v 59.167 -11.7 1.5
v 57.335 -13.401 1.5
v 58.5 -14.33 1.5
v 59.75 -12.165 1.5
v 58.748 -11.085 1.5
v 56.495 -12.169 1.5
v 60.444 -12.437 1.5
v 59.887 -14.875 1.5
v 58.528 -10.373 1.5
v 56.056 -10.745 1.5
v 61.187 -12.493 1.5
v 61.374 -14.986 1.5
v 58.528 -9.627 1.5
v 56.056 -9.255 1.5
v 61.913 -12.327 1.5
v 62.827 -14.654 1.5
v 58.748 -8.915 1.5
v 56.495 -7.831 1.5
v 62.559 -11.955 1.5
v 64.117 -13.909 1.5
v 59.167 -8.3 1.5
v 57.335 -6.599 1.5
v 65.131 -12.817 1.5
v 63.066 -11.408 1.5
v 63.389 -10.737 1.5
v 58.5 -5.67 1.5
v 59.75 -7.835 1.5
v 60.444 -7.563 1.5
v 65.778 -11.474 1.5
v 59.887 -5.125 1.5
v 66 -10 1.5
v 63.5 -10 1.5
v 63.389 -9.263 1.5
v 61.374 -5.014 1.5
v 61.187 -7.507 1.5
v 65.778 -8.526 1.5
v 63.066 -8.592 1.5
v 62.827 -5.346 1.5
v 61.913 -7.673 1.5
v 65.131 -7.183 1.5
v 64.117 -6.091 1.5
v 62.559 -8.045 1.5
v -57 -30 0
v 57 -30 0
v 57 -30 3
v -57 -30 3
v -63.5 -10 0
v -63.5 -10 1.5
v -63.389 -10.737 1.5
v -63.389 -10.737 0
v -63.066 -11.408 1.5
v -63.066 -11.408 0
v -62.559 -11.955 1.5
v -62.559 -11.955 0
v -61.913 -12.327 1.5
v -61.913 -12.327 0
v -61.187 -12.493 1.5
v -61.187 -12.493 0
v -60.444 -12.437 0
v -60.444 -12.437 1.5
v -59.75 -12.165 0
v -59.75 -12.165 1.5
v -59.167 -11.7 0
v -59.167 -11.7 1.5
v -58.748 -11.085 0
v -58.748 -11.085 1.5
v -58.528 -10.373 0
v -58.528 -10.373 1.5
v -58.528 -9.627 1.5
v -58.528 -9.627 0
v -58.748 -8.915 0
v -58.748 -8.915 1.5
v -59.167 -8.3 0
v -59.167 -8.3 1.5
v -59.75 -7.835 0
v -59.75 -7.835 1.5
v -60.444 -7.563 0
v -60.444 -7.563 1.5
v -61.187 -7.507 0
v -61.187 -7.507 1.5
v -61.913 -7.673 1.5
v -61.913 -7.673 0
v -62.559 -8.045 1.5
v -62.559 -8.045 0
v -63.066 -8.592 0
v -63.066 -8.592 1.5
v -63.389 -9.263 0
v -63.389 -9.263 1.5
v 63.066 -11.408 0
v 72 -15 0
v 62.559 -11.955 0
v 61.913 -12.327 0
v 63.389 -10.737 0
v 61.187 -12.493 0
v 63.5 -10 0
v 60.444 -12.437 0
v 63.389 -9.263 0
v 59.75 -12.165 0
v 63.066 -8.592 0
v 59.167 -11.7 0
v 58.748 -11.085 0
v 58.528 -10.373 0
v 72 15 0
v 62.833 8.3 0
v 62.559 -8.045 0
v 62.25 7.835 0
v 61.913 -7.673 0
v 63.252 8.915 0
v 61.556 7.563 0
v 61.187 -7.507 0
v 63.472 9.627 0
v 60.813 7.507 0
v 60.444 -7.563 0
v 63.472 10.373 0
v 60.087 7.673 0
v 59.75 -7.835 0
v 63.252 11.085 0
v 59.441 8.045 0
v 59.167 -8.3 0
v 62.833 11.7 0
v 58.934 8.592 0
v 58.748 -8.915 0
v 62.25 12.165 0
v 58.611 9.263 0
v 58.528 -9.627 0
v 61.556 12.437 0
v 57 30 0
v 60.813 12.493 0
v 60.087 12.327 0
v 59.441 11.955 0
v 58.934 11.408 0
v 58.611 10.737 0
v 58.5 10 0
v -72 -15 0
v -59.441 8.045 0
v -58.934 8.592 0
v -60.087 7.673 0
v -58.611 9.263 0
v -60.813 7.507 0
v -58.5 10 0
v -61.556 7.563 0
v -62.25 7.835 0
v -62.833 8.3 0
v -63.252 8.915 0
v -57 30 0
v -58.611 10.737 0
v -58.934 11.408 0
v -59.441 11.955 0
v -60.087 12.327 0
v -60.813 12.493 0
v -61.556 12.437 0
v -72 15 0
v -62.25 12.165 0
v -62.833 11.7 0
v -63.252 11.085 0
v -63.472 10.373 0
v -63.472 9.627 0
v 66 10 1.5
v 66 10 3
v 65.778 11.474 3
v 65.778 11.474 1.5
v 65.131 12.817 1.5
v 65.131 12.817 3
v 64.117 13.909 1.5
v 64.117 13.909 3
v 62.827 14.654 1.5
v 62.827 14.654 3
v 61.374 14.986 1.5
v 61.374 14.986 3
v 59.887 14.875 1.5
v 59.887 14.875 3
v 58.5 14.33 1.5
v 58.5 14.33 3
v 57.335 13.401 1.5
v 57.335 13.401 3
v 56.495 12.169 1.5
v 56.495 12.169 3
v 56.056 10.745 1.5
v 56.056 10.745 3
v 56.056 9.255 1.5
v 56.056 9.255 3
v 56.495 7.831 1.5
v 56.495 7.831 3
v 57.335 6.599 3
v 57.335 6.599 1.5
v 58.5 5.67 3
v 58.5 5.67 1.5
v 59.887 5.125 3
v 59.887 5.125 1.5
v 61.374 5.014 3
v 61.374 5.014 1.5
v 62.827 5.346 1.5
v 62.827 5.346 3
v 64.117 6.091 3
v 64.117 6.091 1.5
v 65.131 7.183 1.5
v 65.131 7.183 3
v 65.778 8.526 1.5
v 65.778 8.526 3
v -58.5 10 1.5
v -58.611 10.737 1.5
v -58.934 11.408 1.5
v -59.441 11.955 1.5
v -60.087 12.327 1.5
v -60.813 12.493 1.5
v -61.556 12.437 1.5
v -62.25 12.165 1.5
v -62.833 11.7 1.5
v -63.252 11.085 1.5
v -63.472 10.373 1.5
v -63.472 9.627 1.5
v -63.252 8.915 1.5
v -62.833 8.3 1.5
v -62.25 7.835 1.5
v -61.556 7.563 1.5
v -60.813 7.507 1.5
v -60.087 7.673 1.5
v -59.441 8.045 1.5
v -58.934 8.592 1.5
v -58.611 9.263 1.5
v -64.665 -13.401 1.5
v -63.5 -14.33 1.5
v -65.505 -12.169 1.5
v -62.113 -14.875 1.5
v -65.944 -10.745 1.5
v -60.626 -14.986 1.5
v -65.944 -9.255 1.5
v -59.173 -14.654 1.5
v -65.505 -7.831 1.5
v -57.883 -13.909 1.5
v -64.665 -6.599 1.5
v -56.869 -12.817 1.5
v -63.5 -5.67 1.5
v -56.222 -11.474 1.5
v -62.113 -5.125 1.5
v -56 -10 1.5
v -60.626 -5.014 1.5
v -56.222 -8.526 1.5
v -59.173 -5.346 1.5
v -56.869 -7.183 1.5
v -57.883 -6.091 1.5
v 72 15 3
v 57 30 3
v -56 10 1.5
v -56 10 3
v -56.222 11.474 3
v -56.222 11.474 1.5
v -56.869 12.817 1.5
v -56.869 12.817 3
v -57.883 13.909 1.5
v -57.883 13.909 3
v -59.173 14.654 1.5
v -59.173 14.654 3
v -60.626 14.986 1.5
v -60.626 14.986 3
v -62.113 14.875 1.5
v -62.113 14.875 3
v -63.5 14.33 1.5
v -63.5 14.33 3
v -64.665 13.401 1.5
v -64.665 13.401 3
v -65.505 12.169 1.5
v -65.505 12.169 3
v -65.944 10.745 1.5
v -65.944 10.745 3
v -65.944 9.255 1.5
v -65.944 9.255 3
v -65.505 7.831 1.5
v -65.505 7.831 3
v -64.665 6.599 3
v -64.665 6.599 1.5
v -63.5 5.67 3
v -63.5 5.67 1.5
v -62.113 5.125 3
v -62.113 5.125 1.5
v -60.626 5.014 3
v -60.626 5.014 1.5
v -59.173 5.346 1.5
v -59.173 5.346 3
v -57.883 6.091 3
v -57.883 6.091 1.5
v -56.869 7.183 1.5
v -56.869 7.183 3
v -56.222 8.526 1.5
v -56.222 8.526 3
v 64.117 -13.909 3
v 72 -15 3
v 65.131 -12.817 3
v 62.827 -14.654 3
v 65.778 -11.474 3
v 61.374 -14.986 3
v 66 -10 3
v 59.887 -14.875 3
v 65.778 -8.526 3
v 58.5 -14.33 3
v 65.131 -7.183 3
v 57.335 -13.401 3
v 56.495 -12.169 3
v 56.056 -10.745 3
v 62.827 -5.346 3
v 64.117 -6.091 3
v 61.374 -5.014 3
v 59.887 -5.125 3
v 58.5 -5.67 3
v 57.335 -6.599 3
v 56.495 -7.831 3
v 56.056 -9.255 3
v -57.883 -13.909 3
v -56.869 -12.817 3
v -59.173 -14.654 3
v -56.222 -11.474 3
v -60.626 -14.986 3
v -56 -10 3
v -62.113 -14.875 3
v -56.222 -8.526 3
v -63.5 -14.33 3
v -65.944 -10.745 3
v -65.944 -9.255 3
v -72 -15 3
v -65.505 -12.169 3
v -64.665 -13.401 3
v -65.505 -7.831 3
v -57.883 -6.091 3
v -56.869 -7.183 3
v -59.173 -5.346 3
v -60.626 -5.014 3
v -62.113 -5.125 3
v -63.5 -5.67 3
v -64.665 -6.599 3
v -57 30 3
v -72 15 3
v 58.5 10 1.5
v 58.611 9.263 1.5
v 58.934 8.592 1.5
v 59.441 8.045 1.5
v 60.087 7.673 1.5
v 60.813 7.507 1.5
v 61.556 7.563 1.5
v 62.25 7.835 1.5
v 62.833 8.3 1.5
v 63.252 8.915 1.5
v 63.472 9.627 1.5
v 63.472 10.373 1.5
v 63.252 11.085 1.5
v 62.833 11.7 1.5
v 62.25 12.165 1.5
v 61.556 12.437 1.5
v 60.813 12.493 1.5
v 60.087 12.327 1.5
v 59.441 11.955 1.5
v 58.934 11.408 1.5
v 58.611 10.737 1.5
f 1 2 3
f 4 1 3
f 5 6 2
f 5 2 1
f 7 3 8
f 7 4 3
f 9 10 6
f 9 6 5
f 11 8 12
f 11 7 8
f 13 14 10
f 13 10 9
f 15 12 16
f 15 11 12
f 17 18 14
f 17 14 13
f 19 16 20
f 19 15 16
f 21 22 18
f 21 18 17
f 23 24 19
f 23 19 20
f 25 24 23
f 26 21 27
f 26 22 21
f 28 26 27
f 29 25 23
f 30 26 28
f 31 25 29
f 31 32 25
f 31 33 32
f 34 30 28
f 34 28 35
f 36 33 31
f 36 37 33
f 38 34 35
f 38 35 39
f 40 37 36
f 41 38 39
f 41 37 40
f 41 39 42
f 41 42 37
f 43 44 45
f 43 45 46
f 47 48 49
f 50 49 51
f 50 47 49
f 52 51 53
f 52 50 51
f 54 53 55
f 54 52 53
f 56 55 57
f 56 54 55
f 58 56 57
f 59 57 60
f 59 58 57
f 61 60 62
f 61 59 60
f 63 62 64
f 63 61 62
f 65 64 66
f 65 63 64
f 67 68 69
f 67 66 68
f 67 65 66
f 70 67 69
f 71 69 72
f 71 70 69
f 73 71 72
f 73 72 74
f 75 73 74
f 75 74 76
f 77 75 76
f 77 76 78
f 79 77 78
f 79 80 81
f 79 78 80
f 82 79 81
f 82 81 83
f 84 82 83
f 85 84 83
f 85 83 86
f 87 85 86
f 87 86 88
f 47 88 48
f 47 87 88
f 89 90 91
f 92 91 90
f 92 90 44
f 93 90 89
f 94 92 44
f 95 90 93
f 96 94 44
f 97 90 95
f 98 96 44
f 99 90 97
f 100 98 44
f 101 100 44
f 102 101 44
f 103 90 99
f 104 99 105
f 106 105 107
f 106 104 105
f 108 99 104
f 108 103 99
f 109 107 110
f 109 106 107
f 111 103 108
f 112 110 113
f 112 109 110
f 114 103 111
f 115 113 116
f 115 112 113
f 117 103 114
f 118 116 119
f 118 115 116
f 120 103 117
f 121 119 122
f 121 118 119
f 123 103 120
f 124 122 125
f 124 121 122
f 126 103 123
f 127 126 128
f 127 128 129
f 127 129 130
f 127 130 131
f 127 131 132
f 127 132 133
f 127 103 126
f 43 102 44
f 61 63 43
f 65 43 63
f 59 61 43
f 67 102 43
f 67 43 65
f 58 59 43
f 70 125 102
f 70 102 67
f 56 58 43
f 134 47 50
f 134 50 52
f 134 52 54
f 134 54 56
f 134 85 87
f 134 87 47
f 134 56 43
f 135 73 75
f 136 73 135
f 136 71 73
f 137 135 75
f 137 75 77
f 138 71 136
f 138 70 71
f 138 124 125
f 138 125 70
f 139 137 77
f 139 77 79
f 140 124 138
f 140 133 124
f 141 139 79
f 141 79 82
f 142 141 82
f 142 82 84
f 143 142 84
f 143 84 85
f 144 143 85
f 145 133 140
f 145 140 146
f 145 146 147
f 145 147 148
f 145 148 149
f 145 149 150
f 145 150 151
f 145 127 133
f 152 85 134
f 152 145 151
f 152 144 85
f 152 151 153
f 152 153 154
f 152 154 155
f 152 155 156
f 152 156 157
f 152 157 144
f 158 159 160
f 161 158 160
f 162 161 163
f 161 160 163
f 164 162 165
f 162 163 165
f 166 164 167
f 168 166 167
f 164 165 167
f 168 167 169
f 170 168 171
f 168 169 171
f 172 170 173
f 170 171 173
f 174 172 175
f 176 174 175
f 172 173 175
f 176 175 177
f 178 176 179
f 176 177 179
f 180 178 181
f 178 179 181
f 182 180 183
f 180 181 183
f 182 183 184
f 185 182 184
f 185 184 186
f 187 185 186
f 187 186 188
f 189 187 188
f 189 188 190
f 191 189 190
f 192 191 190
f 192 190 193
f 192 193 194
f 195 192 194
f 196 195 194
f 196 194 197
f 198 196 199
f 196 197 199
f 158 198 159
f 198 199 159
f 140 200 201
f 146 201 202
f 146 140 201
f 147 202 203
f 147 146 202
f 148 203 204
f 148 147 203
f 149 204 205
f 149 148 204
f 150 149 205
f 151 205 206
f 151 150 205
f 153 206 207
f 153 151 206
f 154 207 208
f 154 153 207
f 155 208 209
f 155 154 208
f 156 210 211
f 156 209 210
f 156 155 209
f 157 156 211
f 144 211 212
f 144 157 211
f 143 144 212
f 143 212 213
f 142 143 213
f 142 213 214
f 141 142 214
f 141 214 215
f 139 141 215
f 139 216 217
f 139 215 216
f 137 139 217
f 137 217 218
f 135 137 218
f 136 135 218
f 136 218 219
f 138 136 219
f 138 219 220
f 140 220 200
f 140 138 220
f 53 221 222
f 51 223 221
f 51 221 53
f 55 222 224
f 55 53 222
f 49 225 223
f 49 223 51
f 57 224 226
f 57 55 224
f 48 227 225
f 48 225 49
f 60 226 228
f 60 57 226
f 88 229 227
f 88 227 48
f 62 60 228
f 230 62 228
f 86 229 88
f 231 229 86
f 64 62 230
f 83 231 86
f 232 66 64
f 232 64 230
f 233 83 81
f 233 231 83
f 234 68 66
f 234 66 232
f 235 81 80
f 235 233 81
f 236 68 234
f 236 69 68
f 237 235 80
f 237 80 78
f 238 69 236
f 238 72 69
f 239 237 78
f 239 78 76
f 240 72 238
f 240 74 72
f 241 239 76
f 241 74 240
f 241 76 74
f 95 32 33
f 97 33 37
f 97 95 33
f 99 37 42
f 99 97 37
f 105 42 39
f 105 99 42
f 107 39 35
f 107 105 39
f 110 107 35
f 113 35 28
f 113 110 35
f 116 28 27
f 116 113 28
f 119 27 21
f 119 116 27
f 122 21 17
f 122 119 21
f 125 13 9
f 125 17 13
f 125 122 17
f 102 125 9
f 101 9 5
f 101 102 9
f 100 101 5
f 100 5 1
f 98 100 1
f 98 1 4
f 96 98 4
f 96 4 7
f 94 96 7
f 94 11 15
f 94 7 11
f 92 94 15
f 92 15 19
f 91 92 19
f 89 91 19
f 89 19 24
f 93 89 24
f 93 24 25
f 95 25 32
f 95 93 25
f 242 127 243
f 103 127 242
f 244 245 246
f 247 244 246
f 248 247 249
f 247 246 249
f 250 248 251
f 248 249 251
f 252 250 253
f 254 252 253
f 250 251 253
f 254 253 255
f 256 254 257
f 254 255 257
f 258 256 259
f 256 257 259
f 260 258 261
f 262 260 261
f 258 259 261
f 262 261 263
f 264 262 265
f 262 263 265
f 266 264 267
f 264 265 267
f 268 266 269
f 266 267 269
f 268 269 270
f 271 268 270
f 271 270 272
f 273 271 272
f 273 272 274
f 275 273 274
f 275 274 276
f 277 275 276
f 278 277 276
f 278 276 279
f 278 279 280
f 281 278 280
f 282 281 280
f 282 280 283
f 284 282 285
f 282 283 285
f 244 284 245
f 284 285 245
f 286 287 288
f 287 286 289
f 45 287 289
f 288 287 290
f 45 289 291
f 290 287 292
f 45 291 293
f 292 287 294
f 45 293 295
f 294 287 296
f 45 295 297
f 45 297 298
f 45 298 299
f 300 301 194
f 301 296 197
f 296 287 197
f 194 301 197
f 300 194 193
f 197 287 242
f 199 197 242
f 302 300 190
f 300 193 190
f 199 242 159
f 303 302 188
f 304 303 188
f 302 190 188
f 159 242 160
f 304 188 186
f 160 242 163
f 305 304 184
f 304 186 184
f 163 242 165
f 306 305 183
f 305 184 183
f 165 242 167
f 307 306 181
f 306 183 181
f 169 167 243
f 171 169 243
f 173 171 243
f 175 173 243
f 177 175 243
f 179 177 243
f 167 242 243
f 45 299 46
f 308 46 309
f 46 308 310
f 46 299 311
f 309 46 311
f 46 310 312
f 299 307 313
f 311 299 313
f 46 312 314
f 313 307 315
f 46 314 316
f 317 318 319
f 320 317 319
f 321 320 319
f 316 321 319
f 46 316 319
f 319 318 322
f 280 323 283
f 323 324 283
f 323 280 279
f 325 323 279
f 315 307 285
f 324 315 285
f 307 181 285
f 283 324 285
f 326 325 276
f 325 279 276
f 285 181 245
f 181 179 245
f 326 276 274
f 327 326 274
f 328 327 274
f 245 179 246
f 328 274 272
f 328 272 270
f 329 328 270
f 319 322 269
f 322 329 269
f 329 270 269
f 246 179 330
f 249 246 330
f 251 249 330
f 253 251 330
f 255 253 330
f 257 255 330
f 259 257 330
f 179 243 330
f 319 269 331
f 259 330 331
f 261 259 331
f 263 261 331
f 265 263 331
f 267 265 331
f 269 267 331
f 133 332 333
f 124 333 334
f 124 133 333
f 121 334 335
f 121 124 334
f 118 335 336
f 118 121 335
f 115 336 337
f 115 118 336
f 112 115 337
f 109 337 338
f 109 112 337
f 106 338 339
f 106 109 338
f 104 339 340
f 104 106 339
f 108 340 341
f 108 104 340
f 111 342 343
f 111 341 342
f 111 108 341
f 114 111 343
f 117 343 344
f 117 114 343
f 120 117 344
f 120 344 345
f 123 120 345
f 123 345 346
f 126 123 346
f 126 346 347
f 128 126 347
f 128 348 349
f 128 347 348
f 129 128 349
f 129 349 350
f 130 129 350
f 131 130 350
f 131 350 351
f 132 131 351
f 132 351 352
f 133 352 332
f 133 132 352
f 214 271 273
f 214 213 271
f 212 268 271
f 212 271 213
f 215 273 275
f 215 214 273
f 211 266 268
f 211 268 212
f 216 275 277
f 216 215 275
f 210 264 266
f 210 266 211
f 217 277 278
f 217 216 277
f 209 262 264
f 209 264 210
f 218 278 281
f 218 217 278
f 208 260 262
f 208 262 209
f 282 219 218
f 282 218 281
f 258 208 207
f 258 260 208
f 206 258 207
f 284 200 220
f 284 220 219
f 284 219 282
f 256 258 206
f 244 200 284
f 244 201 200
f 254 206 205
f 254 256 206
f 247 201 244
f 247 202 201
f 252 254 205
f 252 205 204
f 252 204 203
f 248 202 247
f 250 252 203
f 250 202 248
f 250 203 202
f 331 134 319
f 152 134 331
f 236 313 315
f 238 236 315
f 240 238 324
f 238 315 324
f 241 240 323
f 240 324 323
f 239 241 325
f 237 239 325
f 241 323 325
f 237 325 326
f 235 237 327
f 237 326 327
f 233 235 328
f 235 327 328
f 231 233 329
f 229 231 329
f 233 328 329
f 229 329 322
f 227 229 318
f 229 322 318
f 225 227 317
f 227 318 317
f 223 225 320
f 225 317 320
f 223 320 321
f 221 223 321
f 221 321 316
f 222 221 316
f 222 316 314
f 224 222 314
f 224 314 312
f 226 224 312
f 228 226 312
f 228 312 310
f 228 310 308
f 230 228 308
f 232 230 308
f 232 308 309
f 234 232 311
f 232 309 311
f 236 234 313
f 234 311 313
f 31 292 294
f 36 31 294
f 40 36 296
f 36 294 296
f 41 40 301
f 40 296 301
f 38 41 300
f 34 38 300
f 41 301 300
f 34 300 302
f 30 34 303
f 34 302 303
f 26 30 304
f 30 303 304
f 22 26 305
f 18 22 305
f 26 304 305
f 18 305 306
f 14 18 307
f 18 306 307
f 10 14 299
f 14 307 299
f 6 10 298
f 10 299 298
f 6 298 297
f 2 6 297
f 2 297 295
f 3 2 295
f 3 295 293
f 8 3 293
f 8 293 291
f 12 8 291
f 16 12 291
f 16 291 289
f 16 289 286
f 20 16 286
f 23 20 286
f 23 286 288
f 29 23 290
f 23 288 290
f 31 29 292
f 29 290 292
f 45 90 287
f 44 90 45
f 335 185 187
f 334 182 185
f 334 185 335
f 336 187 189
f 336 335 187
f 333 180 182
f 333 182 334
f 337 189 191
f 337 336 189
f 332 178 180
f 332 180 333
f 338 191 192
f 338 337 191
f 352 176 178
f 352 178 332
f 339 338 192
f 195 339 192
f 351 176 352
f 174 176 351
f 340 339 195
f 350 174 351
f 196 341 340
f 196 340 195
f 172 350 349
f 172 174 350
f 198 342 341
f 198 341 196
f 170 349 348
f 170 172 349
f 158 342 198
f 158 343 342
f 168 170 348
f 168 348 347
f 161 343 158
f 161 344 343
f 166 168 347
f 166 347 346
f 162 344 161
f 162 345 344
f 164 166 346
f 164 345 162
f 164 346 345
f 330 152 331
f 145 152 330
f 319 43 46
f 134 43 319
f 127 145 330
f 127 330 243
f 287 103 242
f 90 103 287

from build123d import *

# Parameters (mm, degrees)
SKETCH1_R           = 2.5
BOSS_EXTRUDE1_DEPTH = 3
SKETCH2_R           = 5
CUT_EXTRUDE1_DEPTH  = 1.5


with BuildPart() as part:
    # Sketch1 → Boss-Extrude1 (new body)
    with BuildSketch(Plane.XY):
        Polygon((-57, 30), (57, 30), (72, 15), (72, -15), (57, -30), (-57, -30), (-72, -15), (-72, 15), align=None)
        with Locations((-61, 10)):
            Circle(SKETCH1_R, mode=Mode.SUBTRACT)
        with Locations(Location((61, 10, 0), (0, 0, 180))):
            Circle(SKETCH1_R, mode=Mode.SUBTRACT)
        with Locations((61, -10)):
            Circle(SKETCH1_R, mode=Mode.SUBTRACT)
        with Locations(Location((-61, -10, 0), (0, 0, 180))):
            Circle(SKETCH1_R, mode=Mode.SUBTRACT)
    extrude(amount=BOSS_EXTRUDE1_DEPTH)

    # Sketch2 → Cut-Extrude1 (cut)
    with BuildSketch(Plane.XY.offset(3)):
        with Locations((-61, -10)):
            Circle(SKETCH2_R)
        with Locations((-61, 10)):
            Circle(SKETCH2_R)
        with Locations((61, 10)):
            Circle(SKETCH2_R)
        with Locations((61, -10)):
            Circle(SKETCH2_R)
    extrude(amount=-CUT_EXTRUDE1_DEPTH, mode=Mode.SUBTRACT)


solid = part.part
